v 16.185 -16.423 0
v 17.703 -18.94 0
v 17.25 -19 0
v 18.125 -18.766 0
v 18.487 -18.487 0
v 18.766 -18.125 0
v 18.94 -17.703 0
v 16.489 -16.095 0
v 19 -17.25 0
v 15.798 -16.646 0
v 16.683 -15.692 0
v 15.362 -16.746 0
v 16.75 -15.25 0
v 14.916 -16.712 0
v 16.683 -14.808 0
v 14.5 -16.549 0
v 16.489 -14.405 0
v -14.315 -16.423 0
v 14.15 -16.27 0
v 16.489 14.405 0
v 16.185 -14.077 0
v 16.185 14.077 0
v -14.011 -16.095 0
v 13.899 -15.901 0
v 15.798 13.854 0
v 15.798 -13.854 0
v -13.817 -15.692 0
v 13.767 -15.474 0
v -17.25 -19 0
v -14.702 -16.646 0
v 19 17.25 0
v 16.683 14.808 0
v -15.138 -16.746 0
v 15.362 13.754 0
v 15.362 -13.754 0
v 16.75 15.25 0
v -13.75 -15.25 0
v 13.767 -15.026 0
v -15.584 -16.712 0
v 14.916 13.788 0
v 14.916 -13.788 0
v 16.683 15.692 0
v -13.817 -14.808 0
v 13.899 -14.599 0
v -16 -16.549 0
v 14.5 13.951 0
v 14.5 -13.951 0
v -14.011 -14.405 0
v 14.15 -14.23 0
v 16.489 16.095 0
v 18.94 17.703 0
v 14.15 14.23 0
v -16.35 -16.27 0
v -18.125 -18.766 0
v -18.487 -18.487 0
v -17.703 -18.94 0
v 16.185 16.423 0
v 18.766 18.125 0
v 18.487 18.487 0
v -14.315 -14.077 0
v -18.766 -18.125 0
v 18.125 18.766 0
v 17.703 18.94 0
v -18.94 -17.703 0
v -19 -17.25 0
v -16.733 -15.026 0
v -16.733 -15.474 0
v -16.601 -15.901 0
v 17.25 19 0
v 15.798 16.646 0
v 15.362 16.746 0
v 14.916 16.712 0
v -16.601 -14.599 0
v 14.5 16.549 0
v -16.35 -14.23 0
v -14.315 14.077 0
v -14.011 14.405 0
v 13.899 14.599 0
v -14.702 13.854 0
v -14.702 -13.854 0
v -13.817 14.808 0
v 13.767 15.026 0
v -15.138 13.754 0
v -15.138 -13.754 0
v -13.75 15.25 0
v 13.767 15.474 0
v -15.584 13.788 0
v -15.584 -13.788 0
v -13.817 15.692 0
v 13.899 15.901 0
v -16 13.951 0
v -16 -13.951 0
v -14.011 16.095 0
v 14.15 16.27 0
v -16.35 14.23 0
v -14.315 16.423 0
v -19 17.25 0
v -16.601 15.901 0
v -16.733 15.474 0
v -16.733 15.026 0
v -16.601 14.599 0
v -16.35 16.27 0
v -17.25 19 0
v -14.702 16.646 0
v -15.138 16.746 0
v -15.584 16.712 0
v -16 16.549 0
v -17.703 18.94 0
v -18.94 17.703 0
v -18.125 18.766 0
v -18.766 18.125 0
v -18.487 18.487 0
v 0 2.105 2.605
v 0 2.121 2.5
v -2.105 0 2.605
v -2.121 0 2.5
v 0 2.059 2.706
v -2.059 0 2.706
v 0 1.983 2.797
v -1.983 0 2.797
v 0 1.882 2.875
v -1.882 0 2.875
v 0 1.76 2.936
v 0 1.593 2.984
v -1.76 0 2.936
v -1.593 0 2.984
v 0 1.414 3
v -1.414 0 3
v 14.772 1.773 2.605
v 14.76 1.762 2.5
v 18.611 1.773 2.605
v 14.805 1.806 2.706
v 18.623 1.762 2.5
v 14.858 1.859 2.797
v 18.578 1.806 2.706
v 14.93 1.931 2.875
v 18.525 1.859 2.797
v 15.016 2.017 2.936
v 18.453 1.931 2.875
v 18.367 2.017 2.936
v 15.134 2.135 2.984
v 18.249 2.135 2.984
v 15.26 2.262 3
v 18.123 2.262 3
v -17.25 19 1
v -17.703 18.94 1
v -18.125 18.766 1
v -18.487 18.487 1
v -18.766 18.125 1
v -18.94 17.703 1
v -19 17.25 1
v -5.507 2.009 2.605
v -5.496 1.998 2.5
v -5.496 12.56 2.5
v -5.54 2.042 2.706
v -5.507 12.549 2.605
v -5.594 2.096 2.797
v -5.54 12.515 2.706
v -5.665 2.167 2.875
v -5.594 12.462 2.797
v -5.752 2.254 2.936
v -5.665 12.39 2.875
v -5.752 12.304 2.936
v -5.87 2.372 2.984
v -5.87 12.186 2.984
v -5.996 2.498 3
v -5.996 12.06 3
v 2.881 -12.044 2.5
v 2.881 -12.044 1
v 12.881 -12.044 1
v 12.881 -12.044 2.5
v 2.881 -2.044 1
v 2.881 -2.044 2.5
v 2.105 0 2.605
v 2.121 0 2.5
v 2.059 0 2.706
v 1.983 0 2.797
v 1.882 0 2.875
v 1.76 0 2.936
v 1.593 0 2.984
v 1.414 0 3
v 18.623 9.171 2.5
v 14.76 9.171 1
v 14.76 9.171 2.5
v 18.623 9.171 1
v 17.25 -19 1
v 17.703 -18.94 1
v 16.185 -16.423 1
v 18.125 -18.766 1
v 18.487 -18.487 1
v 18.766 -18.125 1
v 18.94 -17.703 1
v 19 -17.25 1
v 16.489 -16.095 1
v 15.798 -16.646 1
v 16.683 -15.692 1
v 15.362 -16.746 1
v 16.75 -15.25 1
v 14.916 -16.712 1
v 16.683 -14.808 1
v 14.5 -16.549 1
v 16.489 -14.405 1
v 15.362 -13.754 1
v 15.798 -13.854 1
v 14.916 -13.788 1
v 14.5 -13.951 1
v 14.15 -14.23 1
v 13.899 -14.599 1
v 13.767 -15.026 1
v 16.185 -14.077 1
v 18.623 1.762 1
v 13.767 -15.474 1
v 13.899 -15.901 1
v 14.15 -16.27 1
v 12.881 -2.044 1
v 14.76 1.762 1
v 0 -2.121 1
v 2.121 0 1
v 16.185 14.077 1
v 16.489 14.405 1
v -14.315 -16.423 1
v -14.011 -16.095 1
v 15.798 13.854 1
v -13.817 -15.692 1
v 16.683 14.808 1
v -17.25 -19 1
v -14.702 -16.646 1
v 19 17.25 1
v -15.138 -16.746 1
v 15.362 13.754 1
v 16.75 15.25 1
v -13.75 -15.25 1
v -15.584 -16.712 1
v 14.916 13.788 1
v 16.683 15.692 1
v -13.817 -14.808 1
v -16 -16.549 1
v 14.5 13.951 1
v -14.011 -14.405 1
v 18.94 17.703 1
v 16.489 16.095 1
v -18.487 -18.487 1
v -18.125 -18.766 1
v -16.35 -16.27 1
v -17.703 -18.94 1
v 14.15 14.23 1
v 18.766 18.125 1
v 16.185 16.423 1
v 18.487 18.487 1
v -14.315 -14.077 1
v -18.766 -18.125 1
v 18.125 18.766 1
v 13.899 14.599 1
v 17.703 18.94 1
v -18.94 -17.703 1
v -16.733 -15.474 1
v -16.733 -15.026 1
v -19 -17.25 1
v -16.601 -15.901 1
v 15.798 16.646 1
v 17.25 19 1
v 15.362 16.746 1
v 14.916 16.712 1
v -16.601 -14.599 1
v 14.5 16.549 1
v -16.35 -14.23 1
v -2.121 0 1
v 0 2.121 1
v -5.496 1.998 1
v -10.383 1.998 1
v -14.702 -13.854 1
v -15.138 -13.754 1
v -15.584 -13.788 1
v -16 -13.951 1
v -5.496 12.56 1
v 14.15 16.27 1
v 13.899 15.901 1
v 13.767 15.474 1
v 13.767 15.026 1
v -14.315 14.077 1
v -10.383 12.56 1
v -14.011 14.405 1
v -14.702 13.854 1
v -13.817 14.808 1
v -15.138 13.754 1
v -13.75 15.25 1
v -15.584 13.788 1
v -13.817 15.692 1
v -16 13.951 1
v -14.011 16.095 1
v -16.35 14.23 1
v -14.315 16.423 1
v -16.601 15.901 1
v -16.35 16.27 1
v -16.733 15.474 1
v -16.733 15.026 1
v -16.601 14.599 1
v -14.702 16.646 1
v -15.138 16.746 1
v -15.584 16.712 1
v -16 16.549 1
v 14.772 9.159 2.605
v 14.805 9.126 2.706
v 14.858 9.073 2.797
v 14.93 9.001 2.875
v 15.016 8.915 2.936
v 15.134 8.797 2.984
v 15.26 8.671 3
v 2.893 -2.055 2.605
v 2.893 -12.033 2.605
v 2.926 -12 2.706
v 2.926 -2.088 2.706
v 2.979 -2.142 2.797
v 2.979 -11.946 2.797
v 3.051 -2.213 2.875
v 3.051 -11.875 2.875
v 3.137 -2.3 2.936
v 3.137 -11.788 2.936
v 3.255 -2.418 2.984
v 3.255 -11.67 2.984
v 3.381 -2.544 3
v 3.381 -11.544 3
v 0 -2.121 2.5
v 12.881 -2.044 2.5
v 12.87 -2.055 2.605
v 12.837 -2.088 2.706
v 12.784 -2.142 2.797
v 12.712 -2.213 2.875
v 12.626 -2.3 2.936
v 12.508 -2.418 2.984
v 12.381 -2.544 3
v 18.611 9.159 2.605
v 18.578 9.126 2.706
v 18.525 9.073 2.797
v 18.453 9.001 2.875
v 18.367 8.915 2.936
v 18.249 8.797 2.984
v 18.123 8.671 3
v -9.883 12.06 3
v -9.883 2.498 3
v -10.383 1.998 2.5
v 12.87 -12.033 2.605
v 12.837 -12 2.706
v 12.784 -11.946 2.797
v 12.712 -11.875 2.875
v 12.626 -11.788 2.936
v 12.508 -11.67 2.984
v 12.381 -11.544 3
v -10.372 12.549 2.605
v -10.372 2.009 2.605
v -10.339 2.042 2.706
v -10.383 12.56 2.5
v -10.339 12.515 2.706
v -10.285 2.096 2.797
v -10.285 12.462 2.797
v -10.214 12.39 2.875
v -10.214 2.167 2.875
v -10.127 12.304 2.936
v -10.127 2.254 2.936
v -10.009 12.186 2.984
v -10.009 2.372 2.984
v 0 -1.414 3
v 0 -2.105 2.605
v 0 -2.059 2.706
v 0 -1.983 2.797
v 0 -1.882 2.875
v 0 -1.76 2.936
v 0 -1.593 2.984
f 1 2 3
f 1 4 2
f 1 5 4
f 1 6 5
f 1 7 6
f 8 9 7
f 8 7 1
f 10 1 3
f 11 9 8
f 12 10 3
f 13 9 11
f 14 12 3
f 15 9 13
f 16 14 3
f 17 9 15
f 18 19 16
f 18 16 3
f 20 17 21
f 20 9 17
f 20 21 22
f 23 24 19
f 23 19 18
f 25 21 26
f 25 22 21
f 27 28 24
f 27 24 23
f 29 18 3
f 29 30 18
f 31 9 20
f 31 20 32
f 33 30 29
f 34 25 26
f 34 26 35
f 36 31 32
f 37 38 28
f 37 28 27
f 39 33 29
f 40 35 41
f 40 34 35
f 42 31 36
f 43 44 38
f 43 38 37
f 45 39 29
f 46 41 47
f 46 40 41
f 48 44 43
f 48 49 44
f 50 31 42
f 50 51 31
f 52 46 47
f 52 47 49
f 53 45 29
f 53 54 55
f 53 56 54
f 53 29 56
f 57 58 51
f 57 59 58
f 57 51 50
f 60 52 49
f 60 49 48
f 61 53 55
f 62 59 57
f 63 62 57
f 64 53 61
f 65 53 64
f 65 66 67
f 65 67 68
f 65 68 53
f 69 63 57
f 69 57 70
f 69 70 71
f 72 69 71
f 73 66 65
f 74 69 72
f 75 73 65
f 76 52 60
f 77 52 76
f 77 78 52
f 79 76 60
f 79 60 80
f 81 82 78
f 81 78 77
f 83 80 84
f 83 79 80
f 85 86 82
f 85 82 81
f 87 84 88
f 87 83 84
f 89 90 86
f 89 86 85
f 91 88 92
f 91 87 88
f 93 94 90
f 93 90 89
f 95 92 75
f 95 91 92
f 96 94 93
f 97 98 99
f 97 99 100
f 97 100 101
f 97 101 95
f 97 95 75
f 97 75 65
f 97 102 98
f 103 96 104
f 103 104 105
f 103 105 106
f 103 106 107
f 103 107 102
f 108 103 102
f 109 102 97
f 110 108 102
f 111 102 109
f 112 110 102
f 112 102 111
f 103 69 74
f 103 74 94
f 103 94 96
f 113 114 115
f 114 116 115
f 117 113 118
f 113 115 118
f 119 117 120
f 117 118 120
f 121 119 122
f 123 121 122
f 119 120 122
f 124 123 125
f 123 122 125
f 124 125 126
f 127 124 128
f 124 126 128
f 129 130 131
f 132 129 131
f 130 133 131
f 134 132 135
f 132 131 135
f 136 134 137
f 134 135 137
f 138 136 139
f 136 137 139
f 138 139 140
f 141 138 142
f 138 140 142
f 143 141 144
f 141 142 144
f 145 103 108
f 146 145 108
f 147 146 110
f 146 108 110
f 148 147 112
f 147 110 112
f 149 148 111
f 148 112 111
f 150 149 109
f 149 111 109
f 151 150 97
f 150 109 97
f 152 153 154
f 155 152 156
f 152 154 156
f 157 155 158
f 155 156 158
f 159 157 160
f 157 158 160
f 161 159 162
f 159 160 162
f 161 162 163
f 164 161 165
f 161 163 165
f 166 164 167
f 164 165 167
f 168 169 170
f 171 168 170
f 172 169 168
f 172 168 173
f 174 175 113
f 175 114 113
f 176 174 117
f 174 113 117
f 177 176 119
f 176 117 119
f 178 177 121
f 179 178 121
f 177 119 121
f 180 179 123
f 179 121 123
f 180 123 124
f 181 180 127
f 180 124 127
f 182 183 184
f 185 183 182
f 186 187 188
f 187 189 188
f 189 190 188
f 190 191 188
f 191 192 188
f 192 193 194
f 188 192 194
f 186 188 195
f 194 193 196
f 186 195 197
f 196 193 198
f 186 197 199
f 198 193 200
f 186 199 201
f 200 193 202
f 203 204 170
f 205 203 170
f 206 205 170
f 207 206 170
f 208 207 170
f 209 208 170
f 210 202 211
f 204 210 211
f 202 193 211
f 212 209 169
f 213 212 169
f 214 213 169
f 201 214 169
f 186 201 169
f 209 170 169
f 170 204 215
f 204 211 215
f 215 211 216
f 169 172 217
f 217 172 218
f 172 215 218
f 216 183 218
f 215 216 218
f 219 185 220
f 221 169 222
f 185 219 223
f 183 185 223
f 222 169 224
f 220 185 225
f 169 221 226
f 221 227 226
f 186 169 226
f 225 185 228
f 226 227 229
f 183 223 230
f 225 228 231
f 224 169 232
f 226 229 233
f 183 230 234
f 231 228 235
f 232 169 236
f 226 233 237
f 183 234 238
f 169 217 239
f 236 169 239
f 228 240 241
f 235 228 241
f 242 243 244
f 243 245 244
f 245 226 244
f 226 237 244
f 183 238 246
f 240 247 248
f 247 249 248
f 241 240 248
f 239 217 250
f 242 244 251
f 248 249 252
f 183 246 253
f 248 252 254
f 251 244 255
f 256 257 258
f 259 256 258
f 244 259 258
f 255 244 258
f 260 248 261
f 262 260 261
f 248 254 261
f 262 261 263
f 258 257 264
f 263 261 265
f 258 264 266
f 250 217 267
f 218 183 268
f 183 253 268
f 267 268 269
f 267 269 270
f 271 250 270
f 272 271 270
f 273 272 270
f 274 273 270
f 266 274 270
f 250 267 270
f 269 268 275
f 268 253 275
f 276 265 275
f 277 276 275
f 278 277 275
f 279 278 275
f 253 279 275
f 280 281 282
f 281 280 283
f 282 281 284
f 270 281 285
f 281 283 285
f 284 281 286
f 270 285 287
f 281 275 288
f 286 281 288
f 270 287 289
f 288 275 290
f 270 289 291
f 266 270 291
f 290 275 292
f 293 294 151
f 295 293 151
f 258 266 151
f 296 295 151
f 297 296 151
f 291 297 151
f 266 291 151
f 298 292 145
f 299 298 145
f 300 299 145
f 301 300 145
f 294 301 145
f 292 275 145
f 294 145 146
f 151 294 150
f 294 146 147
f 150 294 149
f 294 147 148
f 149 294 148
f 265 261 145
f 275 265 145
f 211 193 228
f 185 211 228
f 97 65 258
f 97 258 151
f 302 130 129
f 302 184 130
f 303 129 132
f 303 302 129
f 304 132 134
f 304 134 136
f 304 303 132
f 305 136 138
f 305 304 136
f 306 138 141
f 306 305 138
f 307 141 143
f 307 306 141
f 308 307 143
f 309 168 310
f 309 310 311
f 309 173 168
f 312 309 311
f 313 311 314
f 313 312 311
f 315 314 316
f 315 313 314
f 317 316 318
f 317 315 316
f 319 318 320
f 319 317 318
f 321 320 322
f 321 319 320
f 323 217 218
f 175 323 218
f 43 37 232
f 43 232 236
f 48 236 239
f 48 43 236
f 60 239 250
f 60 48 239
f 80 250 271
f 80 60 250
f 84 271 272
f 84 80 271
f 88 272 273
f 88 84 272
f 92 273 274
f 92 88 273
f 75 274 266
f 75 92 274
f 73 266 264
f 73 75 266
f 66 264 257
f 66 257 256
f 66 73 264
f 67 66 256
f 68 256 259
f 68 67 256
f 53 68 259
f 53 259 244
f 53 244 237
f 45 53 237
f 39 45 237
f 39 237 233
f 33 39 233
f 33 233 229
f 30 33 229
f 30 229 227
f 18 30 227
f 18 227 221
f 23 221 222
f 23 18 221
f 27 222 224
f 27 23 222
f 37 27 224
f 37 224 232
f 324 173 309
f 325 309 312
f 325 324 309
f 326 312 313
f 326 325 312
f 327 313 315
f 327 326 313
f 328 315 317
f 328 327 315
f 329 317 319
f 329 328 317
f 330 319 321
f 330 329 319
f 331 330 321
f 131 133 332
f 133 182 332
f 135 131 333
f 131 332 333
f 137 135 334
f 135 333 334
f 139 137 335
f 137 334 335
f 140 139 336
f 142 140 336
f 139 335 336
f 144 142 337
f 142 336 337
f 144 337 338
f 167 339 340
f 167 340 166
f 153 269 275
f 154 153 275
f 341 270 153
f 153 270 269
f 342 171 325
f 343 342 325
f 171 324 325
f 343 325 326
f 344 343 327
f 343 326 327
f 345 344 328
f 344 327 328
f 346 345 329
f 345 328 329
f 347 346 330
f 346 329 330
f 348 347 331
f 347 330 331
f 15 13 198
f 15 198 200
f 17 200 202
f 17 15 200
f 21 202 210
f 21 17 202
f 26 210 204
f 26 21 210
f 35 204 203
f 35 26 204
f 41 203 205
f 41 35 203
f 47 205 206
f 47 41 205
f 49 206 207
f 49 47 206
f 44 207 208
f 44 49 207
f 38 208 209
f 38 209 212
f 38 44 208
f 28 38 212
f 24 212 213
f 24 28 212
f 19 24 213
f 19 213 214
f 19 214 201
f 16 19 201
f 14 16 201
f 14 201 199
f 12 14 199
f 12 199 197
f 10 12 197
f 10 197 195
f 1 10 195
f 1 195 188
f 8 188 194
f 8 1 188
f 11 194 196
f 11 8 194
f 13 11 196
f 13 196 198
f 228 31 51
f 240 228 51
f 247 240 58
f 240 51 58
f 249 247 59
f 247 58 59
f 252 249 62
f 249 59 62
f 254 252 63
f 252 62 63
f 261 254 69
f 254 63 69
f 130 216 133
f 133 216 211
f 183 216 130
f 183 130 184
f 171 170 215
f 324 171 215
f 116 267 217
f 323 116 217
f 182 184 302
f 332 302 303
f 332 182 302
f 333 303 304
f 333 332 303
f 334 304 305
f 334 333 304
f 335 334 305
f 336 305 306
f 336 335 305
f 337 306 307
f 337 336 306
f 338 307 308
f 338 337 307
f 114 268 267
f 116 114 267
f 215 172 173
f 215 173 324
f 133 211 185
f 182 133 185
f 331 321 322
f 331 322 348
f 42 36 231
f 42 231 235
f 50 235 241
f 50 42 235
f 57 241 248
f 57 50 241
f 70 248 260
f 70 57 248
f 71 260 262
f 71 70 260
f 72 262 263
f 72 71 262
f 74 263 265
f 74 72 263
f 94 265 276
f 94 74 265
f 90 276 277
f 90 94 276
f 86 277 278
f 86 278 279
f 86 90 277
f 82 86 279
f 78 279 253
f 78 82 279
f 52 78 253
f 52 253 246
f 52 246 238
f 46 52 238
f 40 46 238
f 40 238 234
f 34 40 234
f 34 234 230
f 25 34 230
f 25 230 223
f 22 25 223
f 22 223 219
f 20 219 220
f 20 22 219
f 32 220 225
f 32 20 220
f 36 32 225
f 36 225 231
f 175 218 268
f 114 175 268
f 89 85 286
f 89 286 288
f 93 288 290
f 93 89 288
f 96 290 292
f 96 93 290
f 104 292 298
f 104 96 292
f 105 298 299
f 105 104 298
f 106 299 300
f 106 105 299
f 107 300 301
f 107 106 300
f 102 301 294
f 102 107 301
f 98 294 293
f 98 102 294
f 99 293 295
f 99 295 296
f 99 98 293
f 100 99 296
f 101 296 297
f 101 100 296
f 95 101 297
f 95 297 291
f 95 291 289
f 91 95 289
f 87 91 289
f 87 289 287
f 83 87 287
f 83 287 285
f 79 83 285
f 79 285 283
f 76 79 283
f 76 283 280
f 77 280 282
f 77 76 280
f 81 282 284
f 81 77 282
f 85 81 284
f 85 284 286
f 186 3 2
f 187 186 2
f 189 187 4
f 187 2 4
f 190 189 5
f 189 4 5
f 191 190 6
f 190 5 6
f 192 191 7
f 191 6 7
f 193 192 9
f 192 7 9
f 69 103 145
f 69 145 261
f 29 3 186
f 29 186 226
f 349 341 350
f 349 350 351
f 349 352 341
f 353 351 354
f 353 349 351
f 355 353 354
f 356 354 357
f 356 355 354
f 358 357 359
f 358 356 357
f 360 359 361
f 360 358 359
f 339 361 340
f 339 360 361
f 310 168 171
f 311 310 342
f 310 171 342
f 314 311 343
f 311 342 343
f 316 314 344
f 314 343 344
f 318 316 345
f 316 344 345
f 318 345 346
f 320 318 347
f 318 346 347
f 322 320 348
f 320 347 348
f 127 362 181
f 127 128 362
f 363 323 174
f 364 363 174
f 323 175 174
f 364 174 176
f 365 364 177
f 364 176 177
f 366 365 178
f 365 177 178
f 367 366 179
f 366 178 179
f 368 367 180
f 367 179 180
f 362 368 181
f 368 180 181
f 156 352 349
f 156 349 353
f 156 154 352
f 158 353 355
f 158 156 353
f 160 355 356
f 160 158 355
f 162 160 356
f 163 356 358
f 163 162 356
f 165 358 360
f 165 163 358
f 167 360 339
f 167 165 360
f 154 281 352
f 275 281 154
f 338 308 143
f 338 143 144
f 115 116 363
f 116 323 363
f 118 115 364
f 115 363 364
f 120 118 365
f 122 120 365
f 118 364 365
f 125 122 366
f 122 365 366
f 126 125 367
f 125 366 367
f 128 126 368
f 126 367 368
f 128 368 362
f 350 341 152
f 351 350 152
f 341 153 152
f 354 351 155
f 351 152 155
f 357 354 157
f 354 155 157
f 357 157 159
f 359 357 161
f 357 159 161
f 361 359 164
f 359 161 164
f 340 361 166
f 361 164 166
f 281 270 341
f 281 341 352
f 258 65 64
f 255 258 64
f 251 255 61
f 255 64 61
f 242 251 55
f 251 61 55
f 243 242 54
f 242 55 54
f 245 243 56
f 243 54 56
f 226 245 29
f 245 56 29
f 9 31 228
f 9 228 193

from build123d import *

# Parameters (mm, degrees)
SKETCH_R      = 1.5
PAD_DEPTH     = 1
SKETCH001_W   = 10
SKETCH001_H   = 10
SKETCH001_W_2 = 4.88679
SKETCH001_H_2 = 10.561771
SKETCH001_W_3 = 3.86214
SKETCH001_H_3 = 7.409003
PAD001_DEPTH  = 2
FILLET_R      = 0.5


with BuildPart() as part:
    # Sketch → Pad (new body)
    with BuildSketch(Plane.XY):
        with BuildLine():
            Line((-17.25, 19), (17.25, 19))
            ThreePointArc((19, 17.25), (18.487437, 18.487437), (17.25, 19))
            Line((19, 17.25), (19, -17.25))
            ThreePointArc((17.25, -19), (18.487437, -18.487437), (19, -17.25))
            Line((17.25, -19), (-17.25, -19))
            ThreePointArc((-19, -17.25), (-18.487437, -18.487437), (-17.25, -19))
            Line((-19, -17.25), (-19, 17.25))
            ThreePointArc((-17.25, 19), (-18.487437, 18.487437), (-19, 17.25))
        make_face()
        with Locations((15.25, 15.25)):
            Circle(SKETCH_R, mode=Mode.SUBTRACT)
        with Locations((-15.25, -15.25)):
            Circle(SKETCH_R, mode=Mode.SUBTRACT)
        with Locations((-15.25, 15.25)):
            Circle(SKETCH_R, mode=Mode.SUBTRACT)
        with Locations((15.25, -15.25)):
            Circle(SKETCH_R, mode=Mode.SUBTRACT)
    extrude(amount=PAD_DEPTH)

    # Sketch001 (on Face14 of Pad) → Pad001 (join)
    with BuildSketch(Plane.XY.offset(1)):
        with Locations((7.881429, -7.044085)):
            Rectangle(SKETCH001_W, SKETCH001_H)
        Polygon((0, -2.12132), (2.12132, 0), (0, 2.12132), (-2.12132, 0), align=None)
        with Locations((-7.939527, 7.278862)):
            Rectangle(SKETCH001_W_2, SKETCH001_H_2)
        with Locations((16.691468, 5.466022)):
            Rectangle(SKETCH001_W_3, SKETCH001_H_3)
    extrude(amount=PAD001_DEPTH)

    # Fillet
    fillet_edges = [part.edges().sort_by_distance(p)[0] for p in [
        (1.06066, -1.06066, 3),
        (1.06066, 1.06066, 3),
        (-1.06066, 1.06066, 3),
        (-1.06066, -1.06066, 3),
        (7.881429, -2.044085, 3),
        (12.881429, -7.044085, 3),
        (7.881429, -12.044085, 3),
        (2.881429, -7.044085, 3),
        (-7.939527, 12.559748, 3),
        (-5.496132, 7.278863, 3),
        (-7.939527, 1.997977, 3),
        (-10.382922, 7.278863, 3),
        (16.691468, 9.170523, 3),
        (18.622538, 5.466022, 3),
        (16.691468, 1.76152, 3),
        (14.760398, 5.466022, 3),
    ]]
    fillet(fillet_edges, radius=FILLET_R)


solid = part.part
